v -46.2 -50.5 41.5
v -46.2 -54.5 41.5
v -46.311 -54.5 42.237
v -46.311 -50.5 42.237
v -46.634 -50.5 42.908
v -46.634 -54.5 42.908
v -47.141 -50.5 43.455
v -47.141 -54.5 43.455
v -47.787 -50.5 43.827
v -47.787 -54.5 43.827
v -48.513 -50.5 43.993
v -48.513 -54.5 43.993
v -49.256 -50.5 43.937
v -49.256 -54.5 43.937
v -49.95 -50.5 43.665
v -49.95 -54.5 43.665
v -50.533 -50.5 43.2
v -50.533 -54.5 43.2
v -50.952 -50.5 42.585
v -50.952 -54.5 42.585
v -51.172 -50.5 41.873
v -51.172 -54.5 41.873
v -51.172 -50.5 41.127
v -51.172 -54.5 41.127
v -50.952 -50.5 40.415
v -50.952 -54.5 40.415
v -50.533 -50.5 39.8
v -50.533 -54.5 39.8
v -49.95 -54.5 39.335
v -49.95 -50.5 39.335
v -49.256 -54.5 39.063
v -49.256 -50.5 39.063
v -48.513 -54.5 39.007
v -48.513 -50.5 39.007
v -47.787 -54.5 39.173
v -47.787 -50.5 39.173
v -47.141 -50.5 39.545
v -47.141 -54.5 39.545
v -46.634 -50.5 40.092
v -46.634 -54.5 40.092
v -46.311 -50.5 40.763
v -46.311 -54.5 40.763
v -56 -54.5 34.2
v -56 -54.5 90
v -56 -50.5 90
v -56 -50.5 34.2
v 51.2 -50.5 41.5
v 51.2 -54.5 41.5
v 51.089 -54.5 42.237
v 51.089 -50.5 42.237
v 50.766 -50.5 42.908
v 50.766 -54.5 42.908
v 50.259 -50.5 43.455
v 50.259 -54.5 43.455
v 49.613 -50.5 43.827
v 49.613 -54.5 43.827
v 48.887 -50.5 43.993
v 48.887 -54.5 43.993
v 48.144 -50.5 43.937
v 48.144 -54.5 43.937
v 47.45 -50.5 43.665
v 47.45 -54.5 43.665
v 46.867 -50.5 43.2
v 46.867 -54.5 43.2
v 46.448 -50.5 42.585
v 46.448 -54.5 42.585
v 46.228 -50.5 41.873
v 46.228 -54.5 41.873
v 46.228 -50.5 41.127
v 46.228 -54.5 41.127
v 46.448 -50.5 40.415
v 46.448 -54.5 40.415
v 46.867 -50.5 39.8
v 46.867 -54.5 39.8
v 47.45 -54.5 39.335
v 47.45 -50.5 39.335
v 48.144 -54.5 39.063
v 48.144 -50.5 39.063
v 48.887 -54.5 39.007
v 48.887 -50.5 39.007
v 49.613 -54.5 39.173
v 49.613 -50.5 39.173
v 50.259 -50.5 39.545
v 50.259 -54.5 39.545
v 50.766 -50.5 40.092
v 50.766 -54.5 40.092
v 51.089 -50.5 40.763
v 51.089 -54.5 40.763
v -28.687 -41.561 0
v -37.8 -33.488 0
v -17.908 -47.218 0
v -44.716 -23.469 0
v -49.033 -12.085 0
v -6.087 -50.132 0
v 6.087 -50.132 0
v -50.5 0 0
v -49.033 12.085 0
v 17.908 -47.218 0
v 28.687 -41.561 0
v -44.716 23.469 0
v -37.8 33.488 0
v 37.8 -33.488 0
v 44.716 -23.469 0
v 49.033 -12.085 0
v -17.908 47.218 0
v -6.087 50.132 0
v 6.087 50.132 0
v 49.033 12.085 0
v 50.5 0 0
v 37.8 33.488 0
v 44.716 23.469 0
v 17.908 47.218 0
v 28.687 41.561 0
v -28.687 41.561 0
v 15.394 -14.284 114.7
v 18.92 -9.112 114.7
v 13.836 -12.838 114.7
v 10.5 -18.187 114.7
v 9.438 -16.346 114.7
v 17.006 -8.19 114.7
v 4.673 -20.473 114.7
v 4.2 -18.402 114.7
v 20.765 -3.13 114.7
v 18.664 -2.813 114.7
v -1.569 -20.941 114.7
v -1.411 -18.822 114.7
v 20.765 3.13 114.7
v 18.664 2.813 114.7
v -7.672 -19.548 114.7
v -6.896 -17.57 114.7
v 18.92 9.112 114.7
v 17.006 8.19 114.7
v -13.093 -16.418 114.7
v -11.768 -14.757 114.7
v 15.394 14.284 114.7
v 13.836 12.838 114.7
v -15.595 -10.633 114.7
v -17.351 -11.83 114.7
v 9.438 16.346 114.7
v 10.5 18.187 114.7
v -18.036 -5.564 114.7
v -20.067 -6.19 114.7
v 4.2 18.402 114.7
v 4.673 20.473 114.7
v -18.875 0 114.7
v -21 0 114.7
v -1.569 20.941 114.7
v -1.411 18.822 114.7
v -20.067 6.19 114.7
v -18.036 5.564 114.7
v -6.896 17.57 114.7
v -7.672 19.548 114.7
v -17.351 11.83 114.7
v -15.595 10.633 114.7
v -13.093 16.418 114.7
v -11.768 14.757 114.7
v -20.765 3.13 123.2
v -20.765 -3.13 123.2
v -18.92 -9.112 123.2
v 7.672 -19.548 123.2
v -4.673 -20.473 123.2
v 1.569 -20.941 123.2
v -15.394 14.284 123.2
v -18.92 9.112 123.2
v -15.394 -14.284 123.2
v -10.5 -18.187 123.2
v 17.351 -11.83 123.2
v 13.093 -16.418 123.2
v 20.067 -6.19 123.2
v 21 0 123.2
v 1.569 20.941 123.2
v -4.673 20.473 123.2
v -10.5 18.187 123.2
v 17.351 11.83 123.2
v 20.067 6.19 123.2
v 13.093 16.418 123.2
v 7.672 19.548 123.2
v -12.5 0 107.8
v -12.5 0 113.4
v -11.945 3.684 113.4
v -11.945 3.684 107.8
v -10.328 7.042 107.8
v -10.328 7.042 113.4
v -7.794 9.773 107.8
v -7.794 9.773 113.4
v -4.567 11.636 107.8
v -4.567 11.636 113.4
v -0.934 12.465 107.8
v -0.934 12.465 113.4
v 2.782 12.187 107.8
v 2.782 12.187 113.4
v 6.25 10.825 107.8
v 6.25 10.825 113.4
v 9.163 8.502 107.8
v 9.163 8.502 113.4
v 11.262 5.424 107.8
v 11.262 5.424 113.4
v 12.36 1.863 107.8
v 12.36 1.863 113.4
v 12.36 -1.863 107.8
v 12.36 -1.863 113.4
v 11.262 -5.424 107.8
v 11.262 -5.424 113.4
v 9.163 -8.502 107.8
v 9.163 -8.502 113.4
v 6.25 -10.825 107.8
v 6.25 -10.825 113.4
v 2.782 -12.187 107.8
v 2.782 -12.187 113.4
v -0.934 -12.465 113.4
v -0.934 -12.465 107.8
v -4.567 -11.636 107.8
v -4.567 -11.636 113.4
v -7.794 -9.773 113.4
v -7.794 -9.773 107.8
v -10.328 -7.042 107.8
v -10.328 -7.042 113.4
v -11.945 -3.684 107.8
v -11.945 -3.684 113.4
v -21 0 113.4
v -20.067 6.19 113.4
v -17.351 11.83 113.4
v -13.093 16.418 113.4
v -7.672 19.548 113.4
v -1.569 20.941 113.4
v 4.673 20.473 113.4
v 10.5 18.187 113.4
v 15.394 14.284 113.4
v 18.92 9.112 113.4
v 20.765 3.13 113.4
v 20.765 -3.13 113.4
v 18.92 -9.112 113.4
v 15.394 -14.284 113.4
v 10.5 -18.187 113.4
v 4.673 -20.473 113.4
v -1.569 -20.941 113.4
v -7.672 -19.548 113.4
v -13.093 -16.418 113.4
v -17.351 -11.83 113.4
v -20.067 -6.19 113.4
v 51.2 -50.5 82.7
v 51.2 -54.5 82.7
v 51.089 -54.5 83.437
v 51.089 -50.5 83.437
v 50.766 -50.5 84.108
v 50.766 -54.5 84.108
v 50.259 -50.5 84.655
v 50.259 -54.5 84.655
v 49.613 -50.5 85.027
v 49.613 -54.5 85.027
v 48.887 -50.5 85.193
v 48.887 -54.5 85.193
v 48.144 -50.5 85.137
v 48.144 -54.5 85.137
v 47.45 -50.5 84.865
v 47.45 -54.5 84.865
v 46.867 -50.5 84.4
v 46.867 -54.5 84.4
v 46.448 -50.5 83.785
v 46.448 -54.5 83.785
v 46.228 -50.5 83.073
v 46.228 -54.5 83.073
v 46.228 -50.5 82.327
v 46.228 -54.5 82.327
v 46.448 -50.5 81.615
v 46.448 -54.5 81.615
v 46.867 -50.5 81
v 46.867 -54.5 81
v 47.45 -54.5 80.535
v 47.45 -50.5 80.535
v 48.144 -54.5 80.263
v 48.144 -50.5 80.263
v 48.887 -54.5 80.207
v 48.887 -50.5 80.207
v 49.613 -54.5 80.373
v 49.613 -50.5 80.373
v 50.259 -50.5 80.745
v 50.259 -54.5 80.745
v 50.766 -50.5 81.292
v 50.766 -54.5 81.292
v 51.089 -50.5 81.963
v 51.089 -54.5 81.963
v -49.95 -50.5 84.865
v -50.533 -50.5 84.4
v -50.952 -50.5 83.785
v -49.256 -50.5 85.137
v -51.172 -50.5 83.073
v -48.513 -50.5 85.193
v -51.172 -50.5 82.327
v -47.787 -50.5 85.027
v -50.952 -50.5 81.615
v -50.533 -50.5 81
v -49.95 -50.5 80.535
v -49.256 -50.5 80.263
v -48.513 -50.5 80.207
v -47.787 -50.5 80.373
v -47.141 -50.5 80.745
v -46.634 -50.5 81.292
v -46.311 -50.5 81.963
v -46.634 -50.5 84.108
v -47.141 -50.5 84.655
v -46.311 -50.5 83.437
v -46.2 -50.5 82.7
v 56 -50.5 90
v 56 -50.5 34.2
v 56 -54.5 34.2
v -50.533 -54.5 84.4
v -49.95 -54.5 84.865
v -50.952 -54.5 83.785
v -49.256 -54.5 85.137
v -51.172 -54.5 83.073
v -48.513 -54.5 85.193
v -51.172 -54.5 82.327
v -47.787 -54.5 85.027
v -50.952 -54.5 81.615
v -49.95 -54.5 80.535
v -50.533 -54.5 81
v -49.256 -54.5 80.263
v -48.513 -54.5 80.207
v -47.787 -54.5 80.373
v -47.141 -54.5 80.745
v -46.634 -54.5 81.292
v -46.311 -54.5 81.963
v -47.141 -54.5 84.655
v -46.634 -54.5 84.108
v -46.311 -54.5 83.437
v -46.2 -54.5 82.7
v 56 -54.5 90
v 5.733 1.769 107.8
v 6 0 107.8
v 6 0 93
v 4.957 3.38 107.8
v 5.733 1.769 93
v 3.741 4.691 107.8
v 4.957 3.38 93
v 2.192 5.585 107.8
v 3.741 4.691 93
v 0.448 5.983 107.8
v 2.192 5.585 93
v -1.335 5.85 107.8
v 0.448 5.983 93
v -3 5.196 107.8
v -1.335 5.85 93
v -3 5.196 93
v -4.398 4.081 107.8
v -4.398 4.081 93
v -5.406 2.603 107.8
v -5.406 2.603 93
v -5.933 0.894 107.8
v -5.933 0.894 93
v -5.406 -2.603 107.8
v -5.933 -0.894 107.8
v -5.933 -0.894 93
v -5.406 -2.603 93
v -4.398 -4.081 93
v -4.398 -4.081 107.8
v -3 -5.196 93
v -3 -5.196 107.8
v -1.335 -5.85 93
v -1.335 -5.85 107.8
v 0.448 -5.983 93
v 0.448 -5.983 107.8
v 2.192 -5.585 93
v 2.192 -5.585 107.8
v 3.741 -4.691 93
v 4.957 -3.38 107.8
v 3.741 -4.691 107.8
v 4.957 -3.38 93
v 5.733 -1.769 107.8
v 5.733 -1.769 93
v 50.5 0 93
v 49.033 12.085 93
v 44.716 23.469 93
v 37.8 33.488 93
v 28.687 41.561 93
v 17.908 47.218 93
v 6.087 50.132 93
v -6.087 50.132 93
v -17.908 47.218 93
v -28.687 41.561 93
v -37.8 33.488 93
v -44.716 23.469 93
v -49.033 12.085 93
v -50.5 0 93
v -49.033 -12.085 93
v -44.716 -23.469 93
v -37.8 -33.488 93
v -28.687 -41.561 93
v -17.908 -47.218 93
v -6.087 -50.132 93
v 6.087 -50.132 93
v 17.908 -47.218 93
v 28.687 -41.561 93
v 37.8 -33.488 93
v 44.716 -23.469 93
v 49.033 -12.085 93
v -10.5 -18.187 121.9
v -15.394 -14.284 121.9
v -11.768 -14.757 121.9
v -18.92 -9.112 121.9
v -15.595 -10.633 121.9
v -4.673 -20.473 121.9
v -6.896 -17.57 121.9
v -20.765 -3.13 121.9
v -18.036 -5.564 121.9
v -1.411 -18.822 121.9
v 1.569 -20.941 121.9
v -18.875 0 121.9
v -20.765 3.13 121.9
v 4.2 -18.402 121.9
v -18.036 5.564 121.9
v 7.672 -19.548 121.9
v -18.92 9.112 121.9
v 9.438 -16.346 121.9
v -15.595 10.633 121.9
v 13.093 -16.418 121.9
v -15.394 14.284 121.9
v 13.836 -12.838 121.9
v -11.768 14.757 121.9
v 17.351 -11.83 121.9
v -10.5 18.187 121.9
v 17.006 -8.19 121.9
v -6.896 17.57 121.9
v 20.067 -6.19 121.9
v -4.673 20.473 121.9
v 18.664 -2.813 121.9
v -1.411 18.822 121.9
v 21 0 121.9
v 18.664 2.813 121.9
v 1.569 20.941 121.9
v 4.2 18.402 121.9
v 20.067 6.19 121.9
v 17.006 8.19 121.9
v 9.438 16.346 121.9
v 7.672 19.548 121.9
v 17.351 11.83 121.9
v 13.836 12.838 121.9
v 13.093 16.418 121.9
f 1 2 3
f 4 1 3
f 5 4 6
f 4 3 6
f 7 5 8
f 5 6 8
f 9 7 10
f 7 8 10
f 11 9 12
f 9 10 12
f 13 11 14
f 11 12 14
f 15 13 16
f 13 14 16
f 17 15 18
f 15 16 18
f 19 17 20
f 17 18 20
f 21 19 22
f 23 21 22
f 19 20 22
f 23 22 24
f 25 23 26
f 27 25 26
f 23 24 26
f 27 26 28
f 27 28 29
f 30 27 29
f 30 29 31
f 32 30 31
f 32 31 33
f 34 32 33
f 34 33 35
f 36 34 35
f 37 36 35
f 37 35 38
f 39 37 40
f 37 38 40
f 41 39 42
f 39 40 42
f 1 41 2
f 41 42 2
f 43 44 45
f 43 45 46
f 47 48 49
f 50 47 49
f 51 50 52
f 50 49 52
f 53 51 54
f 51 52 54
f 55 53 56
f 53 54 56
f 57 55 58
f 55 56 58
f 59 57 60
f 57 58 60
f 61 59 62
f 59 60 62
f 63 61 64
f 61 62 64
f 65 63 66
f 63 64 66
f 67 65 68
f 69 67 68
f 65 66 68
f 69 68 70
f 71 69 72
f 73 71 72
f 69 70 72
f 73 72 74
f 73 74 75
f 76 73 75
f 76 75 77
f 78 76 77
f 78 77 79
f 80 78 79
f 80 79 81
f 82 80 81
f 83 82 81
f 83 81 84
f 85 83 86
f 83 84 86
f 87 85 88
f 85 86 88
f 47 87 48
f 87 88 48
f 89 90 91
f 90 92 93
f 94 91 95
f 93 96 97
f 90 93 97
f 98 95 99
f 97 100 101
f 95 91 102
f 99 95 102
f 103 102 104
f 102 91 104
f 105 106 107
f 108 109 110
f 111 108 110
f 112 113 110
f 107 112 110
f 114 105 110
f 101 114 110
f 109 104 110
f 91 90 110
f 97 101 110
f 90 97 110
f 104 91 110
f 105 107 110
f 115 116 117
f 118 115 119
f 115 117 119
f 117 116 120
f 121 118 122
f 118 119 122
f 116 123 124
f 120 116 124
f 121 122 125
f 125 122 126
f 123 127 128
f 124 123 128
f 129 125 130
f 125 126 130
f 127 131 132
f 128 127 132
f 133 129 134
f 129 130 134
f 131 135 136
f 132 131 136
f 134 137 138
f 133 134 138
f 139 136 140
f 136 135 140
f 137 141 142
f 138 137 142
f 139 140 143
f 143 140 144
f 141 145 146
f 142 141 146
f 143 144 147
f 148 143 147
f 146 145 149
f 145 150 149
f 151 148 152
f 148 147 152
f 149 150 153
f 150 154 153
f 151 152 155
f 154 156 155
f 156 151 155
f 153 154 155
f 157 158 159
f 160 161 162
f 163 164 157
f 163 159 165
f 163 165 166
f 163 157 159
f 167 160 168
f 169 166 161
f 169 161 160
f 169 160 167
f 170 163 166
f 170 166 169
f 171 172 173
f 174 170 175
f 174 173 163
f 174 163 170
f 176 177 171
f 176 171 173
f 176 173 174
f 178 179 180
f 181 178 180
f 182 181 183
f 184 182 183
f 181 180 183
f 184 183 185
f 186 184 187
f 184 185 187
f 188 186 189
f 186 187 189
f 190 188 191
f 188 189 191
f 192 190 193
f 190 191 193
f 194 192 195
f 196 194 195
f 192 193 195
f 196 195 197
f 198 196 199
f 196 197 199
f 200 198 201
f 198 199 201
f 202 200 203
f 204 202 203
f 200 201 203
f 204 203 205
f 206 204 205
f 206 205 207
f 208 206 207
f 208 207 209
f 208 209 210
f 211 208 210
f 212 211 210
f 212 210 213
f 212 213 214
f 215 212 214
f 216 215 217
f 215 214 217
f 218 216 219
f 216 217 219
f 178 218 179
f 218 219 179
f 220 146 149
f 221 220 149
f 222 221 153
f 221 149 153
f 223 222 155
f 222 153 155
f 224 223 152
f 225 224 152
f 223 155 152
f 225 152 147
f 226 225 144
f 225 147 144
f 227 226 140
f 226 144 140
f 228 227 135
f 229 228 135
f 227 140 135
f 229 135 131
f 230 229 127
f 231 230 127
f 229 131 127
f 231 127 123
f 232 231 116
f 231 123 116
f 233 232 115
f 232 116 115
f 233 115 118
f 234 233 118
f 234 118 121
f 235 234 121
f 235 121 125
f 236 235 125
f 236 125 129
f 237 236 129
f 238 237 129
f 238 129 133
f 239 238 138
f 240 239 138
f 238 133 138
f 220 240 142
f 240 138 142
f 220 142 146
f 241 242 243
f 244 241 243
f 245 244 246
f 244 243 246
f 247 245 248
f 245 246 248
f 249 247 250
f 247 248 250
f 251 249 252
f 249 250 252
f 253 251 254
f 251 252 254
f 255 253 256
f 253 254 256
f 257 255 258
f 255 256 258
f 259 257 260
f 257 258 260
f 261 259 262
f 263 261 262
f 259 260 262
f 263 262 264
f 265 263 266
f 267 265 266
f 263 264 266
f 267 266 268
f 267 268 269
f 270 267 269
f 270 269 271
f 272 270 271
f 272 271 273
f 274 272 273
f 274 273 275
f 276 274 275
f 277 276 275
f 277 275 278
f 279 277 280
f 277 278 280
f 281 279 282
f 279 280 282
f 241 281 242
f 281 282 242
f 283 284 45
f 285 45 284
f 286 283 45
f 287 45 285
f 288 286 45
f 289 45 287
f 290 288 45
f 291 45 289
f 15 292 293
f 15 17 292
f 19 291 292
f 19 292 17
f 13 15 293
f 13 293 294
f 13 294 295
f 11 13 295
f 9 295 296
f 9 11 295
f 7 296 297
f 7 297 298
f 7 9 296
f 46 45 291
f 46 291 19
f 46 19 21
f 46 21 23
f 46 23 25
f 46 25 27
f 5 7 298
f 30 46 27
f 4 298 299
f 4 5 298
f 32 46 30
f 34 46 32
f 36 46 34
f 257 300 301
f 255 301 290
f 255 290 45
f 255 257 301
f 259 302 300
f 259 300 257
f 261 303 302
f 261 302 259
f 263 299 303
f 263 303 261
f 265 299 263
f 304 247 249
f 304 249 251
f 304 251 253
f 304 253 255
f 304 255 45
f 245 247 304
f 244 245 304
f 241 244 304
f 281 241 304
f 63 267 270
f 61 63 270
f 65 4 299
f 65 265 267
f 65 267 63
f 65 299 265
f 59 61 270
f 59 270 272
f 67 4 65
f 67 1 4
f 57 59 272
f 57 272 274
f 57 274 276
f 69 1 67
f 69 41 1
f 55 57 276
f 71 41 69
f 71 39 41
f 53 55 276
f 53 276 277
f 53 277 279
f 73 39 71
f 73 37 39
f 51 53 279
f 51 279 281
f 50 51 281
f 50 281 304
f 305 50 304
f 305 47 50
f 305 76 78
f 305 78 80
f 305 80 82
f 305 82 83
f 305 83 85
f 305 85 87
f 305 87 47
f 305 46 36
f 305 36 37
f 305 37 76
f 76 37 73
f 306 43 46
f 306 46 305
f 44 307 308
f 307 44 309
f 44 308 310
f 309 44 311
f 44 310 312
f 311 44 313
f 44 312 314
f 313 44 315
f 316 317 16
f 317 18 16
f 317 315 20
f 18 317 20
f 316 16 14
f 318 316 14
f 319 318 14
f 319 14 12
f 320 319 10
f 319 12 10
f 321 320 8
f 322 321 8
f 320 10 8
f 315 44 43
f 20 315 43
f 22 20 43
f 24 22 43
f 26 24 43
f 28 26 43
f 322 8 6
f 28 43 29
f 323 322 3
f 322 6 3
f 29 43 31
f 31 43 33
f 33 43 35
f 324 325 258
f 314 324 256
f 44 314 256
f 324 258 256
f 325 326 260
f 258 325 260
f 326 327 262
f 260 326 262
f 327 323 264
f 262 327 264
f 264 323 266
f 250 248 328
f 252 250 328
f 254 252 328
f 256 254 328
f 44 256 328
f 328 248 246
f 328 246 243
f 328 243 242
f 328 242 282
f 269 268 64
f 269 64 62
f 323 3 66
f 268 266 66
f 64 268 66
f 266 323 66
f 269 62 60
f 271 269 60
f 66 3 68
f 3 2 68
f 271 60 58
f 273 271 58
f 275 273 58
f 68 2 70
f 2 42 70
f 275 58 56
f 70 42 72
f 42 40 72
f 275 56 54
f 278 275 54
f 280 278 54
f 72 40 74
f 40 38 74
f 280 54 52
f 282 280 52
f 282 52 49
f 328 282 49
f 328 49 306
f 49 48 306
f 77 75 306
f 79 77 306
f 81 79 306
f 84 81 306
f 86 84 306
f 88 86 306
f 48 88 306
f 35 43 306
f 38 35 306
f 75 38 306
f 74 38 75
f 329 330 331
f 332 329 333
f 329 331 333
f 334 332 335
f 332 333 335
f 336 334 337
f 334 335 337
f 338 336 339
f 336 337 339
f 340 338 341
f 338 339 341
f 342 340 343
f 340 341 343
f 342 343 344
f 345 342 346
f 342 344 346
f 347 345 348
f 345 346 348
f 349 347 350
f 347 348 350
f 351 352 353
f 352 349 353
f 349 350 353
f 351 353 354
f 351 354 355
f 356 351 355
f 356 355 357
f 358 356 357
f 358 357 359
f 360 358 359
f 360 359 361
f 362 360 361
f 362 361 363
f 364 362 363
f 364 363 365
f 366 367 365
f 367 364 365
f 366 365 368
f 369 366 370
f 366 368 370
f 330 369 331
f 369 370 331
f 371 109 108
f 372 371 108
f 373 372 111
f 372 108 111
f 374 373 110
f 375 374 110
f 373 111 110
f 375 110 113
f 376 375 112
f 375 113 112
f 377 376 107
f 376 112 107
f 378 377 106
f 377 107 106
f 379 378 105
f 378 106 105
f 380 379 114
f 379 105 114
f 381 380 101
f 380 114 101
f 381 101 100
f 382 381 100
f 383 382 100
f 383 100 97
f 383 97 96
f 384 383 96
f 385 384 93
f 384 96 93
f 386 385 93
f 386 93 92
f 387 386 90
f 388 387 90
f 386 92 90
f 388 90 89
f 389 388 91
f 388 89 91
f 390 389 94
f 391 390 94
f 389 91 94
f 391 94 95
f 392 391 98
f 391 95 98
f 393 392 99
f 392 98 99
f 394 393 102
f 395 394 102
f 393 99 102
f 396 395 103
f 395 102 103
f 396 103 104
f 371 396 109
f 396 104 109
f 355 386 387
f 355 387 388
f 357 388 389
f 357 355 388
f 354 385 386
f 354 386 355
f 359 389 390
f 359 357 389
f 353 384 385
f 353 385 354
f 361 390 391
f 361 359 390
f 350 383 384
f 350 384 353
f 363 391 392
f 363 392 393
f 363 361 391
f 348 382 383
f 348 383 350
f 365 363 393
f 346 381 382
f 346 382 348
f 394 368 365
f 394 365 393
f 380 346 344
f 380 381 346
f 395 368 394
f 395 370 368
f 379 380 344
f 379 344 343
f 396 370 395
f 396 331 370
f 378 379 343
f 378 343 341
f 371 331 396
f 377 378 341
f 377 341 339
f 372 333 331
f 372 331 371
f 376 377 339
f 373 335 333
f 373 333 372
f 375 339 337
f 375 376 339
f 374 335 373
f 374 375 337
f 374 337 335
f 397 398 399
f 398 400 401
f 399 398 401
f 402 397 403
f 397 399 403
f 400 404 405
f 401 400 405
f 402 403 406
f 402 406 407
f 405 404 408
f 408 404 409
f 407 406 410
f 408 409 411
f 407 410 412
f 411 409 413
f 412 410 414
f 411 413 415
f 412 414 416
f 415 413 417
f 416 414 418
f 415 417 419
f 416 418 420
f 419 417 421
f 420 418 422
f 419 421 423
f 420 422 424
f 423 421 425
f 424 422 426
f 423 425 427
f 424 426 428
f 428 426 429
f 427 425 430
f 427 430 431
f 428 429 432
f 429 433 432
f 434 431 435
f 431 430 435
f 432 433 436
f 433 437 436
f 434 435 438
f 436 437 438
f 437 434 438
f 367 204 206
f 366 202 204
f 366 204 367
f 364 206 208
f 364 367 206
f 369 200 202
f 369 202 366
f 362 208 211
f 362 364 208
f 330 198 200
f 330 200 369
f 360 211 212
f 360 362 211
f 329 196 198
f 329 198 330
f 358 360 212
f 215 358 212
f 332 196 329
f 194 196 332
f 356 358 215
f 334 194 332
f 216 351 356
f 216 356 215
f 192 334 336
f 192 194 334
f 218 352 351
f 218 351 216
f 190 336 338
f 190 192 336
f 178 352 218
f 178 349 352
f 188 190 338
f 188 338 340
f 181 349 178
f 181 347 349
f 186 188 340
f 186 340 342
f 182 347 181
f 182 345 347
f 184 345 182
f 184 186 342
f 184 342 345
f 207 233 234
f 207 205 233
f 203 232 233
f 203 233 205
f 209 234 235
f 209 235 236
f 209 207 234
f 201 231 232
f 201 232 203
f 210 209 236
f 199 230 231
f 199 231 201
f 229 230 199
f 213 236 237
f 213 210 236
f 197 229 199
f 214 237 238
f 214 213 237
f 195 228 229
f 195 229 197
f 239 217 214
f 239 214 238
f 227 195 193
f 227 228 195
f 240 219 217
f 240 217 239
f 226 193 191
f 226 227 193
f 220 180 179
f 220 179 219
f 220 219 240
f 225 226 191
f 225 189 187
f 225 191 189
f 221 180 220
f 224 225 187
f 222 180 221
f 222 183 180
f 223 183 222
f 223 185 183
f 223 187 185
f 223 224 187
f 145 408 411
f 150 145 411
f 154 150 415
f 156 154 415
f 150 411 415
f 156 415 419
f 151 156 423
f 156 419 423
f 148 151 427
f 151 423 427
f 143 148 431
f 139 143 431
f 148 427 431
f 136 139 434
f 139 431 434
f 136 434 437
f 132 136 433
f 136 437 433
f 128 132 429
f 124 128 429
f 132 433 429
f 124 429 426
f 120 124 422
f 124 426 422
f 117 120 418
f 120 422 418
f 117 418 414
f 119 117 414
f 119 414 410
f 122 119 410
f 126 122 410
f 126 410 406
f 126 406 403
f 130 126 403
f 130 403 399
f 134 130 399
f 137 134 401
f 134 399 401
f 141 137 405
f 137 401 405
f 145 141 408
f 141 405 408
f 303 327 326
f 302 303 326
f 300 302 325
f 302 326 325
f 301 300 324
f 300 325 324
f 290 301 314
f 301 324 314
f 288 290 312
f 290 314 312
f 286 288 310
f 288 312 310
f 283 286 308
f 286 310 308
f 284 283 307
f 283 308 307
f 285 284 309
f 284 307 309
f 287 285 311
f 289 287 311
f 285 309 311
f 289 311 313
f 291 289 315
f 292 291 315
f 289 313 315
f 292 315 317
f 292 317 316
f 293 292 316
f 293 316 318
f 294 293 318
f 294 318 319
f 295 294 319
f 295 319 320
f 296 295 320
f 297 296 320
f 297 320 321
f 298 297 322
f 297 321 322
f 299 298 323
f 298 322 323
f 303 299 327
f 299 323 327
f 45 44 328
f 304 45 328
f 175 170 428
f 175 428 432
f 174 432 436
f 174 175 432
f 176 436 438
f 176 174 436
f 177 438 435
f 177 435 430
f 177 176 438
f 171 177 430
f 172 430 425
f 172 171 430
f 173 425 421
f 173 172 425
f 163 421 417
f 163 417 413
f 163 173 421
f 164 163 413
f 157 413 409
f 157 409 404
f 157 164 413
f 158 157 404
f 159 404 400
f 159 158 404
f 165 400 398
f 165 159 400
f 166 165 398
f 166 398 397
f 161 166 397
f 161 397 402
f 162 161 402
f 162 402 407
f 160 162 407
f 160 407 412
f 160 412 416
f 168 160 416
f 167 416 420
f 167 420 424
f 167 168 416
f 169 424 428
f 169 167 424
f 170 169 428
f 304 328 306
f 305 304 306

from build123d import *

# Parameters (mm, degrees)
SKETCH1_R           = 50.5
BOSS_EXTRUDE1_DEPTH = 93
SKETCH2_R           = 6
BOSS_EXTRUDE2_DEPTH = 30.2
SKETCH3_R           = 21
BOSS_EXTRUDE3_DEPTH = 1.3
SKETCH4_R           = 18.875
BOSS_EXTRUDE4_DEPTH = 7.2
SKETCH5_R           = 21
BOSS_EXTRUDE5_DEPTH = 1.3
SKETCH6_R           = 12.5
BOSS_EXTRUDE6_DEPTH = 5.6
SKETCH9_W           = 112
SKETCH9_H           = 55.8
BOSS_EXTRUDE7_DEPTH = 4
SKETCH10_R          = 2.5
CUT_EXTRUDE1_DEPTH  = 4


with BuildPart() as part:
    # Sketch1 → Boss-Extrude1 (new body)
    with BuildSketch(Plane.XY):
        Circle(SKETCH1_R)
    extrude(amount=BOSS_EXTRUDE1_DEPTH)

    # Sketch2 → Boss-Extrude2 (add)
    with BuildSketch(Plane.XY.offset(93)):
        Circle(SKETCH2_R)
    extrude(amount=BOSS_EXTRUDE2_DEPTH)

    # Sketch3 → Boss-Extrude3 (add)
    with BuildSketch(Plane.XY.offset(123.2)):
        Circle(SKETCH3_R)
    extrude(amount=-BOSS_EXTRUDE3_DEPTH)

    # Sketch4 → Boss-Extrude4 (add)
    with BuildSketch(Plane(origin=(0, 0, 121.9), x_dir=(-1, 0, 0), z_dir=(0, 0, -1))):
        Circle(SKETCH4_R)
    extrude(amount=BOSS_EXTRUDE4_DEPTH)

    # Sketch5 → Boss-Extrude5 (add)
    with BuildSketch(Plane(origin=(0, 0, 114.7), x_dir=(-1, 0, 0), z_dir=(0, 0, -1))):
        Circle(SKETCH5_R)
    extrude(amount=BOSS_EXTRUDE5_DEPTH)

    # Sketch6 → Boss-Extrude6 (add)
    with BuildSketch(Plane(origin=(0, 0, 113.4), x_dir=(-1, 0, 0), z_dir=(0, 0, -1))):
        Circle(SKETCH6_R)
    extrude(amount=BOSS_EXTRUDE6_DEPTH)


with BuildPart() as body_2:
    # Sketch9 → Boss-Extrude7 (new body)
    with BuildSketch(Plane(origin=(0, -54.5, 0), x_dir=(1, 0, 0), z_dir=(0, 1, 0))):
        with Locations((0, -62.1)):
            Rectangle(SKETCH9_W, SKETCH9_H)
    extrude(amount=BOSS_EXTRUDE7_DEPTH)

    # Sketch10 → Cut-Extrude1 (cut)
    with BuildSketch(Plane.XZ.offset(54.5)):
        with Locations((48.7, 82.7)):
            Circle(SKETCH10_R)
        with Locations((48.7, 41.5)):
            Circle(SKETCH10_R)
        with Locations((-48.7, 82.7)):
            Circle(SKETCH10_R)
        with Locations((-48.7, 41.5)):
            Circle(SKETCH10_R)
    extrude(amount=-CUT_EXTRUDE1_DEPTH, mode=Mode.SUBTRACT)


solid = Compound([part.part, body_2.part])
